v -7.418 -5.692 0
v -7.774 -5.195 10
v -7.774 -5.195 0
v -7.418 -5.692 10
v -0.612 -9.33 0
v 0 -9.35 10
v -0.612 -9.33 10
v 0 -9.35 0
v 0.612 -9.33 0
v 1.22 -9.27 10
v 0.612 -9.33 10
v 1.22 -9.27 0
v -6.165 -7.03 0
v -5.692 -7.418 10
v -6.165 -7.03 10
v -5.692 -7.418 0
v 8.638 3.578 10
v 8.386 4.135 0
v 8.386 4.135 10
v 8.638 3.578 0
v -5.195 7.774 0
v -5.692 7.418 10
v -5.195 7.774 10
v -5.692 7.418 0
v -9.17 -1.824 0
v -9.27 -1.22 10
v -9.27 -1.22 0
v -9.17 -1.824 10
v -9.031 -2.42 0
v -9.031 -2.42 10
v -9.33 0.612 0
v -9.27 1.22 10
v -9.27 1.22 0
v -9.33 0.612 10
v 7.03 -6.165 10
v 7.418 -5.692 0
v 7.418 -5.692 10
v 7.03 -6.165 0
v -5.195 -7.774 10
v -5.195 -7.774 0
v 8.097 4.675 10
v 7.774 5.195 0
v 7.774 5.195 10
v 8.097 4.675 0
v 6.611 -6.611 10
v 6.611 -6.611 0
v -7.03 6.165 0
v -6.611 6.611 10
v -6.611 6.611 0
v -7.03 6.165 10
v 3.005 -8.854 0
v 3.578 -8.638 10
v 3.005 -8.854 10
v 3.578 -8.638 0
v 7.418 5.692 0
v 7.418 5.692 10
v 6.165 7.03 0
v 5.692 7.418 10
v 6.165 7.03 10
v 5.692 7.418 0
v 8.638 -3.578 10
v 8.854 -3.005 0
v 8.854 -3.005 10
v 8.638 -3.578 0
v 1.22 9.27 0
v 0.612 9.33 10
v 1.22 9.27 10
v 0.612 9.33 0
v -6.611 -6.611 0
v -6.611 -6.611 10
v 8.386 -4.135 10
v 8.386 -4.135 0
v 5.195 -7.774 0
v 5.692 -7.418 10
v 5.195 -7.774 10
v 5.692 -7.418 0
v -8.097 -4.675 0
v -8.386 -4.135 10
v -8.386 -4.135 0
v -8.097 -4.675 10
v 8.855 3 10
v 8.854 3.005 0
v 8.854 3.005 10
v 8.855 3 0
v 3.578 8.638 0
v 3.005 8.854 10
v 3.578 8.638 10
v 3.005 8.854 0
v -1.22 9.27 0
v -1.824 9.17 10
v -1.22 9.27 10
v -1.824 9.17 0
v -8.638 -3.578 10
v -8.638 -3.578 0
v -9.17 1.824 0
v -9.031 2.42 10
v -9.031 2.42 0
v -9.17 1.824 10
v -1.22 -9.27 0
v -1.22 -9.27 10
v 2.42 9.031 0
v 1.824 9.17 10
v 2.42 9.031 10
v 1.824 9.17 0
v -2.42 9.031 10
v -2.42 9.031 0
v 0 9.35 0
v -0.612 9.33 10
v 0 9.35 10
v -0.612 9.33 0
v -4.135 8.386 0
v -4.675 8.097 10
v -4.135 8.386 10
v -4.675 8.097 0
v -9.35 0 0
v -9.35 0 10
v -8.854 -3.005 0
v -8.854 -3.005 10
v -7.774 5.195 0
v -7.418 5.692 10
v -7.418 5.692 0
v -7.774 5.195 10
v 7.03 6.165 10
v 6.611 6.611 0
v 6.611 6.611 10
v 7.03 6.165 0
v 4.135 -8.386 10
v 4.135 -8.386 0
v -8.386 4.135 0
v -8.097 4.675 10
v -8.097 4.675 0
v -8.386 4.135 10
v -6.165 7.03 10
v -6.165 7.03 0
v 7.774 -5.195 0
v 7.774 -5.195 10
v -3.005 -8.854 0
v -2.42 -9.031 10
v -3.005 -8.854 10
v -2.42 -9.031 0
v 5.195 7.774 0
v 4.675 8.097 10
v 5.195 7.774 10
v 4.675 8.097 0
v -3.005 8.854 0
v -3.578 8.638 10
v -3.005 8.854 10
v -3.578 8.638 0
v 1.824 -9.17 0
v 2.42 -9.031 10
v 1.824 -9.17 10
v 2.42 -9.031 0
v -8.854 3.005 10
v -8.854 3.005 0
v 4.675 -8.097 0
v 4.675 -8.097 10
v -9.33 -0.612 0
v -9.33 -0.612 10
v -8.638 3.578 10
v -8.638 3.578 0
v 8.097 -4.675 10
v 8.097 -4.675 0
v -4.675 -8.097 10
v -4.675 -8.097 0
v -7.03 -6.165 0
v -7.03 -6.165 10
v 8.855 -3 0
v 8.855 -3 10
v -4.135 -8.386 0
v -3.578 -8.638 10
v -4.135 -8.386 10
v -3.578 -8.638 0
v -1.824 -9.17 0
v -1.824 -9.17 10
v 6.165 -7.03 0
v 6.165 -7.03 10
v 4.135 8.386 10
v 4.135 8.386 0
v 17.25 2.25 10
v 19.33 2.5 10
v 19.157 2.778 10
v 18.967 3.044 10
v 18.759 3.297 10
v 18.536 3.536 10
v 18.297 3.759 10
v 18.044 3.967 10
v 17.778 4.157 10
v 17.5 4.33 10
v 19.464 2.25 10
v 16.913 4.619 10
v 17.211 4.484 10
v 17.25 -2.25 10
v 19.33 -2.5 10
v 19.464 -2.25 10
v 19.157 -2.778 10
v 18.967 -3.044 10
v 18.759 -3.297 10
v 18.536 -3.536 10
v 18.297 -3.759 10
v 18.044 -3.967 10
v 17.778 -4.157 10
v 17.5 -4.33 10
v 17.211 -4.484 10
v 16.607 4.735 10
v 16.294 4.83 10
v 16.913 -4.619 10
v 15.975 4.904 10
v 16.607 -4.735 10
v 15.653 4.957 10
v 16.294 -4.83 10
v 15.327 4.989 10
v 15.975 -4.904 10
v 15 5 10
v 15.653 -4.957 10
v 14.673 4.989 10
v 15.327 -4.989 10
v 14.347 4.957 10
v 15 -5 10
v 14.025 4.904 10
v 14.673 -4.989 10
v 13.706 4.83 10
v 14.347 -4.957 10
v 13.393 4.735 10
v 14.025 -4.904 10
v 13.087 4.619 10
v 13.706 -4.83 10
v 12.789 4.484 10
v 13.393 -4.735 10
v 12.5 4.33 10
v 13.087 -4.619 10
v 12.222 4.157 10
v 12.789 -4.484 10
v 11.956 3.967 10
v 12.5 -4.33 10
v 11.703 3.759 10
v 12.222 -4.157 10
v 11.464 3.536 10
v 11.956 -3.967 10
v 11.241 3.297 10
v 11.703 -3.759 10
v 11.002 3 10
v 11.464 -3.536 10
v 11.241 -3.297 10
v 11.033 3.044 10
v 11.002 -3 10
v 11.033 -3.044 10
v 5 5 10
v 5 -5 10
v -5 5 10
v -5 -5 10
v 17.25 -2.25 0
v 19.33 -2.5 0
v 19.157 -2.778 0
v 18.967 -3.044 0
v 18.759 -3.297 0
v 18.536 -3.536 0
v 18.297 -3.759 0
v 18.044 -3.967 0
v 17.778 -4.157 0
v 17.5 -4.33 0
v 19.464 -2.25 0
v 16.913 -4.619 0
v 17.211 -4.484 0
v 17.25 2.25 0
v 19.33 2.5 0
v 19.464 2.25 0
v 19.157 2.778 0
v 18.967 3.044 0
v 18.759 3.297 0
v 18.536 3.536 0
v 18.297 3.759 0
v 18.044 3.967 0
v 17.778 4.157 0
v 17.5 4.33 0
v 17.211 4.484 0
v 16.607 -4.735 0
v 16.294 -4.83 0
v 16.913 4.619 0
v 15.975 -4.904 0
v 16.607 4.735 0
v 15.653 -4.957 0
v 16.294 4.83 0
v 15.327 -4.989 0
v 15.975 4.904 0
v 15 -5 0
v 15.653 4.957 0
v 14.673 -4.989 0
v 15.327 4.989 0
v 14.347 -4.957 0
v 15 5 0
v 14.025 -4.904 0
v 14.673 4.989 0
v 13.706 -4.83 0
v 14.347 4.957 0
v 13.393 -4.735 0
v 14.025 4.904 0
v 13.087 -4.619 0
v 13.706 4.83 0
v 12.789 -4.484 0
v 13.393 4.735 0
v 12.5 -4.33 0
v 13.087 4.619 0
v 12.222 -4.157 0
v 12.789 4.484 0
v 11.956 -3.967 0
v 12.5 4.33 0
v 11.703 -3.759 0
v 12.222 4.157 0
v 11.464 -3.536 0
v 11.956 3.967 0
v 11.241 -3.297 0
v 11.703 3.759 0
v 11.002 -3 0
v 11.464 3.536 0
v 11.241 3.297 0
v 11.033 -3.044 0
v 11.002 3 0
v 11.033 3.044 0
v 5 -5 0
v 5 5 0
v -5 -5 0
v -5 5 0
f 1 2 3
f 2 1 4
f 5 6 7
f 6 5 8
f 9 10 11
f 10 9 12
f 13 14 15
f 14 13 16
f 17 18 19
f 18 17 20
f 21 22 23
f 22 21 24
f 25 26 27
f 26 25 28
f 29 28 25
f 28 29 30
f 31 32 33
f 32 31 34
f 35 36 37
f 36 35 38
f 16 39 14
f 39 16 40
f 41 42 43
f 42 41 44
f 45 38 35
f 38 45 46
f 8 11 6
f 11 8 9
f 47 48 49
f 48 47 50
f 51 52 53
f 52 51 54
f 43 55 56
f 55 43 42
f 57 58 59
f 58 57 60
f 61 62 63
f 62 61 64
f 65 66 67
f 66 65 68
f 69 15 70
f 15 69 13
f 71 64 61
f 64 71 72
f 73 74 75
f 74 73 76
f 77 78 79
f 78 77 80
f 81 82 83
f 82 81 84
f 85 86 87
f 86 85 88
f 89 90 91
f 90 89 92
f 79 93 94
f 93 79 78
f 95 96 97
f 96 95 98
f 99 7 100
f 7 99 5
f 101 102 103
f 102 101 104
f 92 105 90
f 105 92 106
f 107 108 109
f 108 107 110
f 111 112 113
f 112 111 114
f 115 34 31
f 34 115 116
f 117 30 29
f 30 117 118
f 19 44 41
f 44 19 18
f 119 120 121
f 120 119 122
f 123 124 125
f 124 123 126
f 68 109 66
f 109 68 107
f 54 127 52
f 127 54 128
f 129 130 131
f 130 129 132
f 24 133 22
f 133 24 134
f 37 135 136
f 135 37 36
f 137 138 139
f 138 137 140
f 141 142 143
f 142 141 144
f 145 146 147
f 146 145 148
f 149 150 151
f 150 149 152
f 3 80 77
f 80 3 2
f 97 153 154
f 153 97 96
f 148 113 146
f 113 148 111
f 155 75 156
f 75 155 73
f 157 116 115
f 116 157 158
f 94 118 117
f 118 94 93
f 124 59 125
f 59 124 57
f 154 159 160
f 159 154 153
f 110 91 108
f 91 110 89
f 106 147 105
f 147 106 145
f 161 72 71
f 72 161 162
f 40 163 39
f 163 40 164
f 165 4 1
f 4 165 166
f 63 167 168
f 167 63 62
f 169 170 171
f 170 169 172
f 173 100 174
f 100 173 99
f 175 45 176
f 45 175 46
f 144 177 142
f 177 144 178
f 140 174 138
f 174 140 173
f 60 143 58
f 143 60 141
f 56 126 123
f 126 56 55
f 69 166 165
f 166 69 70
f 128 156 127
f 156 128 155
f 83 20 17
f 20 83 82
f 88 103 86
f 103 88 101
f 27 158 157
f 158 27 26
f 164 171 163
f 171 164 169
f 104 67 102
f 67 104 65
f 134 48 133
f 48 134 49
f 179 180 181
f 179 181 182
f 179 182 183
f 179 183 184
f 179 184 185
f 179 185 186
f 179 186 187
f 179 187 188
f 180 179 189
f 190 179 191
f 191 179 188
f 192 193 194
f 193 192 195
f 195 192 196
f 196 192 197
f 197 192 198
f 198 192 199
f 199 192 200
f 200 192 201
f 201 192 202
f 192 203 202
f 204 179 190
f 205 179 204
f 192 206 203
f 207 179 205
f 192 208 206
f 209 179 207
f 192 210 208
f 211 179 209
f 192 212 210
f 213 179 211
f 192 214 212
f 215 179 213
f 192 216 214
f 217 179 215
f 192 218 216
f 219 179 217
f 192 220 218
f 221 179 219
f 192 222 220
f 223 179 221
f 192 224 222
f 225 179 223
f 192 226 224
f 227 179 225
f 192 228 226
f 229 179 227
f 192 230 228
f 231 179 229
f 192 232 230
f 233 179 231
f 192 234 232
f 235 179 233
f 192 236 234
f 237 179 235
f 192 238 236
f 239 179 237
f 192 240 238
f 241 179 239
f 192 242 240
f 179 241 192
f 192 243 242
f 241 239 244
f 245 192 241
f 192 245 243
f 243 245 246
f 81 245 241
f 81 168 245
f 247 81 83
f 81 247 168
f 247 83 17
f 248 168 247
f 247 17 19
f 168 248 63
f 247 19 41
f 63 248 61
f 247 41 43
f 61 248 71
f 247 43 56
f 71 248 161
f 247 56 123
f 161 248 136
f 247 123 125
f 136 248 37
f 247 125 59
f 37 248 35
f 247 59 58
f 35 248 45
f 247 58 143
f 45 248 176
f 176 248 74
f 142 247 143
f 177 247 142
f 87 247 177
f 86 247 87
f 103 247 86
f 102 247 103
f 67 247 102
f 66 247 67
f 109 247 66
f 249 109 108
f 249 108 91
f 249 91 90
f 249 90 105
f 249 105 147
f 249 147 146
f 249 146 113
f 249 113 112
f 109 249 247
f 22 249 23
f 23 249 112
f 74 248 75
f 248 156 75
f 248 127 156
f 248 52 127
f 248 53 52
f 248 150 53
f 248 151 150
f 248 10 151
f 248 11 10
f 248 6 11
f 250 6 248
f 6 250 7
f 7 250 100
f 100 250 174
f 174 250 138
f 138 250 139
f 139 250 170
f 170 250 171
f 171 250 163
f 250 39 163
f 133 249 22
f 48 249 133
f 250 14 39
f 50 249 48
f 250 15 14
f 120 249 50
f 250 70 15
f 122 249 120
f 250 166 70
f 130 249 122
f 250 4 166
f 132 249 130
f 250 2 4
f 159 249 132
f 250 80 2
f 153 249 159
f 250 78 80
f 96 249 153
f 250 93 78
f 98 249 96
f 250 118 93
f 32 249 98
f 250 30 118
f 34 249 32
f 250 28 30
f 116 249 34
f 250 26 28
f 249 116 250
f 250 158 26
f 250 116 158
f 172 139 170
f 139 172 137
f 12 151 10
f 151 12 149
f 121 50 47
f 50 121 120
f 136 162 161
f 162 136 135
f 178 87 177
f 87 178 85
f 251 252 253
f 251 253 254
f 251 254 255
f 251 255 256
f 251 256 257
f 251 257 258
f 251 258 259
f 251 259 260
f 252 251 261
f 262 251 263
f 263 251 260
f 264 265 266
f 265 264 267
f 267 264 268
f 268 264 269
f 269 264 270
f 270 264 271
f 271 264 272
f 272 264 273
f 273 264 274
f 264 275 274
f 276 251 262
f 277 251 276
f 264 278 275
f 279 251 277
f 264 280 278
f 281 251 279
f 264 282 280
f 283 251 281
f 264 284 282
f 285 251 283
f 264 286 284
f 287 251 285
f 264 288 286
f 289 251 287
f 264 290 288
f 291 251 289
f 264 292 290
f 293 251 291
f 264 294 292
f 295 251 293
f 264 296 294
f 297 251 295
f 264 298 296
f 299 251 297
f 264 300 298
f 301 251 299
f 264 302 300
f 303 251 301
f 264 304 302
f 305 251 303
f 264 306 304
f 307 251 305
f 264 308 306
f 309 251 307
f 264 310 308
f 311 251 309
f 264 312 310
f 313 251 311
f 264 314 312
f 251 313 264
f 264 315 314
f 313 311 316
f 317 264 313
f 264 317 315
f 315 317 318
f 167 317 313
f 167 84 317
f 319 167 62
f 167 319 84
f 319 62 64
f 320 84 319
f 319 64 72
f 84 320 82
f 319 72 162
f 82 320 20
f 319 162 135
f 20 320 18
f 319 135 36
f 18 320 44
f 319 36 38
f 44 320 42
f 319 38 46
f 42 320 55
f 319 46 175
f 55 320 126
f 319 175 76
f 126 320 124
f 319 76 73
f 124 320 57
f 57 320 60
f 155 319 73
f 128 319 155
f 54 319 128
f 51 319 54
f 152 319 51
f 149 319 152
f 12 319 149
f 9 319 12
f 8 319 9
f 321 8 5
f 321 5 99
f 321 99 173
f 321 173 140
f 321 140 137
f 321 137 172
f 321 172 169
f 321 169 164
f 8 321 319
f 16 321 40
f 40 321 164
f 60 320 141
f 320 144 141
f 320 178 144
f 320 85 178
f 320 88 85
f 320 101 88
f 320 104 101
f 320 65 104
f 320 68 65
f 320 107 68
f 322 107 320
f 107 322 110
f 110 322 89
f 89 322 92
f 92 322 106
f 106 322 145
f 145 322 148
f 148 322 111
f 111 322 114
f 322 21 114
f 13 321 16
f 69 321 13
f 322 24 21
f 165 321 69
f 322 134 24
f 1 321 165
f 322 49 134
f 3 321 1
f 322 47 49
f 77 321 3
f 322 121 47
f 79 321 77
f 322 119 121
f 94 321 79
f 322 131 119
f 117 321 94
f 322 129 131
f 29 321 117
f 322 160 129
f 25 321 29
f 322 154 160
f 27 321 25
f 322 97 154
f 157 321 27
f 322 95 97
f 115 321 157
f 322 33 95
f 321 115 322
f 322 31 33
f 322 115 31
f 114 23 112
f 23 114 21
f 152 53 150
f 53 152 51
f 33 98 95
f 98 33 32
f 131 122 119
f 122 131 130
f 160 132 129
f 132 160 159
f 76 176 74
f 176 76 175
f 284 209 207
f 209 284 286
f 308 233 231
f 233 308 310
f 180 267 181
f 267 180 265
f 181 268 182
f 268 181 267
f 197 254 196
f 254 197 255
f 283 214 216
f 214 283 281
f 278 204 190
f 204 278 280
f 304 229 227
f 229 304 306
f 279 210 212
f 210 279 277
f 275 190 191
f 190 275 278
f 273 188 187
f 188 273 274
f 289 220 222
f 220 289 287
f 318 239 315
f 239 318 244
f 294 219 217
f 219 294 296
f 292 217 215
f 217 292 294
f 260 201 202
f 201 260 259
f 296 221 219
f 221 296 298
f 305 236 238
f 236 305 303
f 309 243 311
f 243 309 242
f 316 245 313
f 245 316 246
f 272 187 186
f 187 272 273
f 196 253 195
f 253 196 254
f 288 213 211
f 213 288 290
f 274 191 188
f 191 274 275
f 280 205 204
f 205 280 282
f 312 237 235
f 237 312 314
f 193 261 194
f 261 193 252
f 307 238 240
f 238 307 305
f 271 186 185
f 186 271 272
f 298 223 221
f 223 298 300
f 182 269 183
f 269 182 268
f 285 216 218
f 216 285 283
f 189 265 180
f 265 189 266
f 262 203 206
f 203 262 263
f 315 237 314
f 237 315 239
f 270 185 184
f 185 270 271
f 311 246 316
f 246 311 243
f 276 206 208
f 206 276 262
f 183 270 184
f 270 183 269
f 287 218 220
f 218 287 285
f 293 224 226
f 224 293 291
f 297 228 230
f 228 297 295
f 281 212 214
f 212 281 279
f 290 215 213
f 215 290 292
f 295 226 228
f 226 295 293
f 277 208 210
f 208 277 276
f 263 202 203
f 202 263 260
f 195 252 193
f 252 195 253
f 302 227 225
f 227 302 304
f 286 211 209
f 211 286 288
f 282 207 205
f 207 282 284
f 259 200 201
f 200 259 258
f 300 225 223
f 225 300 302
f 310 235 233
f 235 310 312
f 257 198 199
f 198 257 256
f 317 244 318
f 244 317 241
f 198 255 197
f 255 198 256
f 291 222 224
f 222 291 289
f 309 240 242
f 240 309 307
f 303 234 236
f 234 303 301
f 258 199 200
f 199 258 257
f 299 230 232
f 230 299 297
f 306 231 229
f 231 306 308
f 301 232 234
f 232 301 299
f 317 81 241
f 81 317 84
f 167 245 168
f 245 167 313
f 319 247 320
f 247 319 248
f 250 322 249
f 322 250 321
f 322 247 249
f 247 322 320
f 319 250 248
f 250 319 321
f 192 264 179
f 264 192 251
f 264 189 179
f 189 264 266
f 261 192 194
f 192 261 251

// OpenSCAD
// Snap-on tubing clip for a 12.7 mm lab stand rod
// Print orientation: flat on the bed, z = 0 up to z = 10

// ---- Stand rod ----
stand_d     = 12.7;   // stand rod diameter
stand_open  = 10;      // width of the opening cut into the stand ring
stand_r     = stand_d / 2 + 3;  // stand ring outer radius (3 mm wall)

// ---- Tubing ring ----
tube_d      = 6;       // tubing inner diameter
tube_r      = tube_d / 2 + 2;   // tubing ring outer radius (2 mm wall)
tube_x      = 15;      // tubing ring centre X
tube_open_w = 4.5;     // width of the opening cut into the tubing ring

// ---- Bridge ----
bridge_w    = 6;       // bridge width (Y)
bridge_x0   = 8;       // bridge start (X)
bridge_x1   = 12;      // bridge end (X)

// ---- Misc ----
eps         = 0.5;     // cutter overshoot past faces
$fn         = 96;      // smoothness of curved shapes

difference() {
    union() {
        // Stand ring
        cylinder(r = stand_r, h = 10);
        // Tubing ring
        translate([tube_x, 0, 0])
            cylinder(r = tube_r, h = 10);
        // Solid bridge between the rings
        translate([bridge_x0, -bridge_w / 2, 0])
            cube([bridge_x1 - bridge_x0, bridge_w, 10]);
    }

    // Opening in the stand ring (-X side)
    translate([-stand_open / 2, -stand_open / 2, -eps])
        cube([stand_open, stand_open, 10 + 2 * eps]);

    // Opening in the tubing ring (+X side)
    translate([tube_x + tube_open_w / 2, -tube_open_w / 2, -eps])
        cube([tube_open_w, tube_open_w, 10 + 2 * eps]);
}
